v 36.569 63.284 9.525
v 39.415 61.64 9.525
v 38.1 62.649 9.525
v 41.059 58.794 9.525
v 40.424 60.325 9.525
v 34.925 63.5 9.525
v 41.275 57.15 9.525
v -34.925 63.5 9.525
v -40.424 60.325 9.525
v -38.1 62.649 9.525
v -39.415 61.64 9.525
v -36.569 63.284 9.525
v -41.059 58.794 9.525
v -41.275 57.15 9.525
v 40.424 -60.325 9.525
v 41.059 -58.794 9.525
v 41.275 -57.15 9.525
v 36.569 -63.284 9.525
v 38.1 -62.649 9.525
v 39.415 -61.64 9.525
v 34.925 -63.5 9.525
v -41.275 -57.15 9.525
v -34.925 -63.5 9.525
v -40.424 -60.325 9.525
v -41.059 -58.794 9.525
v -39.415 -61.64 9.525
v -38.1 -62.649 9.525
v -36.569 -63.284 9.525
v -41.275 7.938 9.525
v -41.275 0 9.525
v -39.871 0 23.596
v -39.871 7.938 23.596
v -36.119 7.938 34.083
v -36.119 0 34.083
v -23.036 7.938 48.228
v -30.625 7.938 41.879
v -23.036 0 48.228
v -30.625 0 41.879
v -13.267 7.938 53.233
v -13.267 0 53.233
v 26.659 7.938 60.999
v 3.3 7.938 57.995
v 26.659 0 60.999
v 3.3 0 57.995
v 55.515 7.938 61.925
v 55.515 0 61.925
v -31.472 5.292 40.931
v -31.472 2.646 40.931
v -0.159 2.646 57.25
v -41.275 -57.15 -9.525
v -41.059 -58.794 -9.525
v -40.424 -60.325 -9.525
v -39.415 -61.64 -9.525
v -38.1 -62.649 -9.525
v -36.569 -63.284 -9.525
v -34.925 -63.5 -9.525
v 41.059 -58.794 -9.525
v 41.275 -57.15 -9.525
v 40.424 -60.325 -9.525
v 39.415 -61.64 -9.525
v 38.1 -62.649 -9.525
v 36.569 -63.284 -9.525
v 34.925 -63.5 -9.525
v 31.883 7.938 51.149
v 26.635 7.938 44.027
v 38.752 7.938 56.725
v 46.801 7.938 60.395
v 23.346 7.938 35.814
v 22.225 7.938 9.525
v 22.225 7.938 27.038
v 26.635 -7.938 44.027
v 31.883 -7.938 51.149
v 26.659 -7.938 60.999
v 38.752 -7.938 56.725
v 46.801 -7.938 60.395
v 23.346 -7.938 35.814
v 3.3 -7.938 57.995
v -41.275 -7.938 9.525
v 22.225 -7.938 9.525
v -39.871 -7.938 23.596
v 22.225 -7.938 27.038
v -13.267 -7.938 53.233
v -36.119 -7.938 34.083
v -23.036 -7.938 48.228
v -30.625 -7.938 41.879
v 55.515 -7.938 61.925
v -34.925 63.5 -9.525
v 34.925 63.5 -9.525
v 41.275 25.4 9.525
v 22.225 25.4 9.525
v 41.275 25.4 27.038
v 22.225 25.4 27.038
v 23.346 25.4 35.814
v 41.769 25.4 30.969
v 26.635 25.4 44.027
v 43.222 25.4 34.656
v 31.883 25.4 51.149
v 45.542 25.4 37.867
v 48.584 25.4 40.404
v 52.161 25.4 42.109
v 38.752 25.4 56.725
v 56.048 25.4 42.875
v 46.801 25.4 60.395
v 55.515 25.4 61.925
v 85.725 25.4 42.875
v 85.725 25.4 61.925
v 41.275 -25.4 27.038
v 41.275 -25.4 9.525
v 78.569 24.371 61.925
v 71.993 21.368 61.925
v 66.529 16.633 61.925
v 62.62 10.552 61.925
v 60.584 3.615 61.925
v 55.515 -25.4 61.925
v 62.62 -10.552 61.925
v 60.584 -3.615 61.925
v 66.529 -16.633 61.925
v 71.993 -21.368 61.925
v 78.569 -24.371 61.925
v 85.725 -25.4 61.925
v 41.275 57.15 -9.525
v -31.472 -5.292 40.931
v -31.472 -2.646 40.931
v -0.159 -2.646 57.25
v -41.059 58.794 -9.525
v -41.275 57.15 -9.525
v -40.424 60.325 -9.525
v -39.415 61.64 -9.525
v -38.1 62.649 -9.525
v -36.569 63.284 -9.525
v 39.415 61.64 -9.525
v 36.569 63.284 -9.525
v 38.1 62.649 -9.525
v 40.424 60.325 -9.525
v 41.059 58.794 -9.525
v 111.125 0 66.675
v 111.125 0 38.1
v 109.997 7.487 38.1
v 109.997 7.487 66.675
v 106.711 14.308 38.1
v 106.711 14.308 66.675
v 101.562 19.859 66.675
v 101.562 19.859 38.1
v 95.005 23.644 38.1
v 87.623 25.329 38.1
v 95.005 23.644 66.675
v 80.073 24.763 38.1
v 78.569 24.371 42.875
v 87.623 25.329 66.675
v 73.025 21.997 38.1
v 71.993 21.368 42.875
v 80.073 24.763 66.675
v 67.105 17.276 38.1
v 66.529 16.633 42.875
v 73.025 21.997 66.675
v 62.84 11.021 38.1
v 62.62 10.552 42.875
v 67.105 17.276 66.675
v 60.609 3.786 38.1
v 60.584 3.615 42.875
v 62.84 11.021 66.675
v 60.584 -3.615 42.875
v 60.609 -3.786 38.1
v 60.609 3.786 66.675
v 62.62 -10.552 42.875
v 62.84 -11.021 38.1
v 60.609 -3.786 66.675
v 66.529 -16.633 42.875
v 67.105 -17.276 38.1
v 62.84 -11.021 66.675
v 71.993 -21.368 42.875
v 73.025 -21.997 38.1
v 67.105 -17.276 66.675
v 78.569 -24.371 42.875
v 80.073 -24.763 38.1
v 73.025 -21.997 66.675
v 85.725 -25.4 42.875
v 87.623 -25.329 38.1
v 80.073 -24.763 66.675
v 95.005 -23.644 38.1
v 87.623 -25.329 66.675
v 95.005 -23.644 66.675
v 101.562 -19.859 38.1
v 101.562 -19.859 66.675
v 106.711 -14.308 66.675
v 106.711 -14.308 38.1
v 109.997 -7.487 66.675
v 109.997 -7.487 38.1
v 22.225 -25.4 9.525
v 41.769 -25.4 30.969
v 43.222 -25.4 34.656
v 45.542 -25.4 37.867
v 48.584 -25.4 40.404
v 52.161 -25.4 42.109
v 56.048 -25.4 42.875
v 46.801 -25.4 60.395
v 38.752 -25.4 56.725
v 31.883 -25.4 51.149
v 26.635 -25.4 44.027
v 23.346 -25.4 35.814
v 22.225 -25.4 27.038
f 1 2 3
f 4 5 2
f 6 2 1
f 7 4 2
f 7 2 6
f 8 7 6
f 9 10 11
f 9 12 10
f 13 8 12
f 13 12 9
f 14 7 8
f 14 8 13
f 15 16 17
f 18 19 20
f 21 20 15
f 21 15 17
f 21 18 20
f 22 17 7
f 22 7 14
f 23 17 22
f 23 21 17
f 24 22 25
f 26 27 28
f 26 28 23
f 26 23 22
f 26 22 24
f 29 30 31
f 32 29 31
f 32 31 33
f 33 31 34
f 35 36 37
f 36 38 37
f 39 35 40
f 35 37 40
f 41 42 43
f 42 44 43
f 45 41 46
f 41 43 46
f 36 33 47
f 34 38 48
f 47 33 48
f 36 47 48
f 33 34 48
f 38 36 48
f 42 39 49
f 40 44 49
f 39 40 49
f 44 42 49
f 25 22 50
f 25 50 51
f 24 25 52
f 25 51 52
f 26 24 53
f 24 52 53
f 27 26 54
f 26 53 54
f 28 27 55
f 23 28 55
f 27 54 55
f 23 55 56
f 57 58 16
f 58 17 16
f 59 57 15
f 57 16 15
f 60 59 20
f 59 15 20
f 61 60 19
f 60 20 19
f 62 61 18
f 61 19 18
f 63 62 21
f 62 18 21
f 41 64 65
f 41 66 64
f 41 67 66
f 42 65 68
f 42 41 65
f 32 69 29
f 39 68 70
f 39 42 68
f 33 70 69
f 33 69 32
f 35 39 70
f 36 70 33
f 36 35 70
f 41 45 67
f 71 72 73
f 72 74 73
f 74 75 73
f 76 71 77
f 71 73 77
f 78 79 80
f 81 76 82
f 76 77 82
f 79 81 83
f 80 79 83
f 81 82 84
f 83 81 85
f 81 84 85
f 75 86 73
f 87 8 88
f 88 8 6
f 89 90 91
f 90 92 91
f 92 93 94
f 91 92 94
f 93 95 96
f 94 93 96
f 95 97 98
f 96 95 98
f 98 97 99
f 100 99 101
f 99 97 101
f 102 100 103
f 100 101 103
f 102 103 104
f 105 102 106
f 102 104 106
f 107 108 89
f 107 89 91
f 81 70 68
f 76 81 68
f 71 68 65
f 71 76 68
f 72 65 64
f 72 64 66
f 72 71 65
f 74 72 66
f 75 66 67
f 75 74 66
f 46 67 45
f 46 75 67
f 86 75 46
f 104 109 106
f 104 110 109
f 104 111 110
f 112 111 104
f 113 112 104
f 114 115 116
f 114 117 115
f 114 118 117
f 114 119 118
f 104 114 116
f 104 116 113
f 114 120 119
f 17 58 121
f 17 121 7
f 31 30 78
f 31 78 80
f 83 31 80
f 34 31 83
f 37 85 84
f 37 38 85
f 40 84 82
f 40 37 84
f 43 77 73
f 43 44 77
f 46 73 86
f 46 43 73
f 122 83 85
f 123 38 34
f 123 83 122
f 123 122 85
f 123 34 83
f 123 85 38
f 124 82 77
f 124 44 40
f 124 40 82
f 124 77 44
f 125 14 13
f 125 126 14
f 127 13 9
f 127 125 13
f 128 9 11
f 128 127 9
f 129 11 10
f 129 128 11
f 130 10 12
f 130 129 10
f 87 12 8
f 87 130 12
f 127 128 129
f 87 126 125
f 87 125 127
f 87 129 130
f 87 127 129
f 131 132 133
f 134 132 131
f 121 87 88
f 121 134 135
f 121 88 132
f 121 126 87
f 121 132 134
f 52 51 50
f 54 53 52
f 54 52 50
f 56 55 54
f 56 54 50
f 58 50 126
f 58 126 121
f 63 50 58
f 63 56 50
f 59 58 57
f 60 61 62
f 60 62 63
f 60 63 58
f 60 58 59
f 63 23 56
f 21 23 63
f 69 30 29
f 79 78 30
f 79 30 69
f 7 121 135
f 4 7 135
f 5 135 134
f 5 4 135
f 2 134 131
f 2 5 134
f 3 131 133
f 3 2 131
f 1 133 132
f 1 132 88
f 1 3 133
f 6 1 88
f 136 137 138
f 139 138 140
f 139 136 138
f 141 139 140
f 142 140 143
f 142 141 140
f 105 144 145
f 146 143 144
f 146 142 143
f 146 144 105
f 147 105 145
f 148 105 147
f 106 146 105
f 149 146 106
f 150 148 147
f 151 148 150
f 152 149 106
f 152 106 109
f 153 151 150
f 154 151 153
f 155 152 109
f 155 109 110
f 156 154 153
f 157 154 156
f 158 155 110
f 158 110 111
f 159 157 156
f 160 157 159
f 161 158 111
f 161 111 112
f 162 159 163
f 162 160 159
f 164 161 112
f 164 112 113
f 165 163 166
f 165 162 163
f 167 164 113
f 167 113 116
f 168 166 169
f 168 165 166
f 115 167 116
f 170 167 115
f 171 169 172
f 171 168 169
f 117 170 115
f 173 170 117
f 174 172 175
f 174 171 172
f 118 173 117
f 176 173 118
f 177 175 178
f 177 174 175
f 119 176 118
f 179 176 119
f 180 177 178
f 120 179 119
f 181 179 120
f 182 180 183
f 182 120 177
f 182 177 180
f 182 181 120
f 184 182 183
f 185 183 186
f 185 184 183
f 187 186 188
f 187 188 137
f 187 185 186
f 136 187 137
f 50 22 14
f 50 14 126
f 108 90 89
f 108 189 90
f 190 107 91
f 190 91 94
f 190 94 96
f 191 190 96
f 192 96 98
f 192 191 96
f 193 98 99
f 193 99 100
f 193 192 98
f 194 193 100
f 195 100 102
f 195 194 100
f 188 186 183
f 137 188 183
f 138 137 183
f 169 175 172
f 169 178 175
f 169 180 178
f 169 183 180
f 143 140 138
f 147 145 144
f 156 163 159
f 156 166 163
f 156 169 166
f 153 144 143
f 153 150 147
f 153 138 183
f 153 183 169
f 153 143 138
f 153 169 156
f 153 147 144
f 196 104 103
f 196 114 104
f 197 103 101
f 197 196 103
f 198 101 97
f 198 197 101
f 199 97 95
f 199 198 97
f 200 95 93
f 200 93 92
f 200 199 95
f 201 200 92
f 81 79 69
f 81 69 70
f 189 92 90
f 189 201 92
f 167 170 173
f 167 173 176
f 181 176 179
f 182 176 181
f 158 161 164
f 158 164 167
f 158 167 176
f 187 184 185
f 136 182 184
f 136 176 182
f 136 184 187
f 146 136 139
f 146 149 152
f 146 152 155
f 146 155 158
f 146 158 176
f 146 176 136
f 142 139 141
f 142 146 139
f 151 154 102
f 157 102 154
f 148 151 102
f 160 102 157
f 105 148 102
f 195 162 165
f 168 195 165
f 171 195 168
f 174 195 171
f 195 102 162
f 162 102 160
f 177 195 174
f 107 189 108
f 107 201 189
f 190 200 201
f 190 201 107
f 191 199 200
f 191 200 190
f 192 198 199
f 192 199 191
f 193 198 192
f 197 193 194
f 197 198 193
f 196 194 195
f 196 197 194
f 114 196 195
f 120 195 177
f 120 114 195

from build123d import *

# Parameters (mm, degrees)
F1_DEPTH = 63.5
F0_W     = 25.4
F0_H     = 19.05
F2_DEPTH = 25.4
F3_DEPTH = 7.9375
F5_R     = 6.35


# Not quite as in the source:
# - ends of sketch curves that miss each other by under 0.0002 mm in the source are joined


with BuildPart() as f1:
    # F0 (on Front) → F1 (new body, symmetric)
    with BuildSketch(Plane.XZ):
        Polygon((-41.275, 9.525), (-41.275, -9.525), (41.275, -9.525), (41.275, 9.525), (22.225, 9.525), align=None)
    extrude(amount=F1_DEPTH, both=True)

    # F5
    f5_edges = [f1.edges().sort_by_distance(p)[0] for p in [
        (41.275, -63.5, 0),
        (41.275, 63.5, 0),
        (-41.275, 63.5, 0),
        (-41.275, -63.5, 0),
    ]]
    fillet(f5_edges, radius=F5_R)


with BuildPart() as f2:
    # F0 (on Front) → F2 (new body, symmetric)
    with BuildSketch(Plane.XZ):
        with BuildLine():
            Line((22.225, 9.525), (41.275, 9.525))
            Line((41.275, 9.525), (41.275, 27.038495028))
            ThreePointArc((41.275, 27.038495028), (45.5416010852, 37.8671929938), (56.0480015287, 42.8752))
            Line((56.0480015287, 42.8752), (60.325, 42.8752))
            Line((60.325, 42.8752), (60.325, 61.9252))
            Line((60.325, 61.9252), (55.5149338856, 61.9252))
            ThreePointArc((55.5149338856, 61.9252), (31.8828245638, 51.1491870645), (22.225, 27.038495028))
            Line((22.225, 27.038495028), (22.225, 9.525))
        make_face()
        with Locations((73.025, 52.4002)):
            Rectangle(F0_W, F0_H)
    extrude(amount=F2_DEPTH, both=True)

    # F0 (on Front) → F4 (revolve)
    with BuildSketch(Plane.XZ):
        Polygon((85.725, 66.675), (85.725, 61.9252), (85.725, 42.8752), (85.725, 38.1), (111.125, 38.1), (111.125, 66.675), align=None)
    revolve(axis=Axis((85.725, 0, 52.3875), (0, 0, 1)))


with BuildPart() as f3:
    # F0 (on Front) → F3 (new body, symmetric)
    with BuildSketch(Plane.XZ):
        with BuildLine():
            add(Edge.make_bspline(
                [(-41.275, 9.525), (-41.275, 49.6220278599), (-13.2913665774, 61.9252), (55.5149338856, 61.9252)],
                knots=[0, 0, 0, 0, 110.0639462386, 110.0639462386, 110.0639462386, 110.0639462386], degree=3))
            Line((-41.275, 9.525), (22.225, 9.525))
            Line((22.225, 9.525), (22.225, 27.038495028))
            ThreePointArc((22.225, 27.038495028), (31.8828245638, 51.1491870645), (55.5149338856, 61.9252))
        make_face()
    extrude(amount=F3_DEPTH, both=True)


solid = Compound([f1.part, f2.part, f3.part])
